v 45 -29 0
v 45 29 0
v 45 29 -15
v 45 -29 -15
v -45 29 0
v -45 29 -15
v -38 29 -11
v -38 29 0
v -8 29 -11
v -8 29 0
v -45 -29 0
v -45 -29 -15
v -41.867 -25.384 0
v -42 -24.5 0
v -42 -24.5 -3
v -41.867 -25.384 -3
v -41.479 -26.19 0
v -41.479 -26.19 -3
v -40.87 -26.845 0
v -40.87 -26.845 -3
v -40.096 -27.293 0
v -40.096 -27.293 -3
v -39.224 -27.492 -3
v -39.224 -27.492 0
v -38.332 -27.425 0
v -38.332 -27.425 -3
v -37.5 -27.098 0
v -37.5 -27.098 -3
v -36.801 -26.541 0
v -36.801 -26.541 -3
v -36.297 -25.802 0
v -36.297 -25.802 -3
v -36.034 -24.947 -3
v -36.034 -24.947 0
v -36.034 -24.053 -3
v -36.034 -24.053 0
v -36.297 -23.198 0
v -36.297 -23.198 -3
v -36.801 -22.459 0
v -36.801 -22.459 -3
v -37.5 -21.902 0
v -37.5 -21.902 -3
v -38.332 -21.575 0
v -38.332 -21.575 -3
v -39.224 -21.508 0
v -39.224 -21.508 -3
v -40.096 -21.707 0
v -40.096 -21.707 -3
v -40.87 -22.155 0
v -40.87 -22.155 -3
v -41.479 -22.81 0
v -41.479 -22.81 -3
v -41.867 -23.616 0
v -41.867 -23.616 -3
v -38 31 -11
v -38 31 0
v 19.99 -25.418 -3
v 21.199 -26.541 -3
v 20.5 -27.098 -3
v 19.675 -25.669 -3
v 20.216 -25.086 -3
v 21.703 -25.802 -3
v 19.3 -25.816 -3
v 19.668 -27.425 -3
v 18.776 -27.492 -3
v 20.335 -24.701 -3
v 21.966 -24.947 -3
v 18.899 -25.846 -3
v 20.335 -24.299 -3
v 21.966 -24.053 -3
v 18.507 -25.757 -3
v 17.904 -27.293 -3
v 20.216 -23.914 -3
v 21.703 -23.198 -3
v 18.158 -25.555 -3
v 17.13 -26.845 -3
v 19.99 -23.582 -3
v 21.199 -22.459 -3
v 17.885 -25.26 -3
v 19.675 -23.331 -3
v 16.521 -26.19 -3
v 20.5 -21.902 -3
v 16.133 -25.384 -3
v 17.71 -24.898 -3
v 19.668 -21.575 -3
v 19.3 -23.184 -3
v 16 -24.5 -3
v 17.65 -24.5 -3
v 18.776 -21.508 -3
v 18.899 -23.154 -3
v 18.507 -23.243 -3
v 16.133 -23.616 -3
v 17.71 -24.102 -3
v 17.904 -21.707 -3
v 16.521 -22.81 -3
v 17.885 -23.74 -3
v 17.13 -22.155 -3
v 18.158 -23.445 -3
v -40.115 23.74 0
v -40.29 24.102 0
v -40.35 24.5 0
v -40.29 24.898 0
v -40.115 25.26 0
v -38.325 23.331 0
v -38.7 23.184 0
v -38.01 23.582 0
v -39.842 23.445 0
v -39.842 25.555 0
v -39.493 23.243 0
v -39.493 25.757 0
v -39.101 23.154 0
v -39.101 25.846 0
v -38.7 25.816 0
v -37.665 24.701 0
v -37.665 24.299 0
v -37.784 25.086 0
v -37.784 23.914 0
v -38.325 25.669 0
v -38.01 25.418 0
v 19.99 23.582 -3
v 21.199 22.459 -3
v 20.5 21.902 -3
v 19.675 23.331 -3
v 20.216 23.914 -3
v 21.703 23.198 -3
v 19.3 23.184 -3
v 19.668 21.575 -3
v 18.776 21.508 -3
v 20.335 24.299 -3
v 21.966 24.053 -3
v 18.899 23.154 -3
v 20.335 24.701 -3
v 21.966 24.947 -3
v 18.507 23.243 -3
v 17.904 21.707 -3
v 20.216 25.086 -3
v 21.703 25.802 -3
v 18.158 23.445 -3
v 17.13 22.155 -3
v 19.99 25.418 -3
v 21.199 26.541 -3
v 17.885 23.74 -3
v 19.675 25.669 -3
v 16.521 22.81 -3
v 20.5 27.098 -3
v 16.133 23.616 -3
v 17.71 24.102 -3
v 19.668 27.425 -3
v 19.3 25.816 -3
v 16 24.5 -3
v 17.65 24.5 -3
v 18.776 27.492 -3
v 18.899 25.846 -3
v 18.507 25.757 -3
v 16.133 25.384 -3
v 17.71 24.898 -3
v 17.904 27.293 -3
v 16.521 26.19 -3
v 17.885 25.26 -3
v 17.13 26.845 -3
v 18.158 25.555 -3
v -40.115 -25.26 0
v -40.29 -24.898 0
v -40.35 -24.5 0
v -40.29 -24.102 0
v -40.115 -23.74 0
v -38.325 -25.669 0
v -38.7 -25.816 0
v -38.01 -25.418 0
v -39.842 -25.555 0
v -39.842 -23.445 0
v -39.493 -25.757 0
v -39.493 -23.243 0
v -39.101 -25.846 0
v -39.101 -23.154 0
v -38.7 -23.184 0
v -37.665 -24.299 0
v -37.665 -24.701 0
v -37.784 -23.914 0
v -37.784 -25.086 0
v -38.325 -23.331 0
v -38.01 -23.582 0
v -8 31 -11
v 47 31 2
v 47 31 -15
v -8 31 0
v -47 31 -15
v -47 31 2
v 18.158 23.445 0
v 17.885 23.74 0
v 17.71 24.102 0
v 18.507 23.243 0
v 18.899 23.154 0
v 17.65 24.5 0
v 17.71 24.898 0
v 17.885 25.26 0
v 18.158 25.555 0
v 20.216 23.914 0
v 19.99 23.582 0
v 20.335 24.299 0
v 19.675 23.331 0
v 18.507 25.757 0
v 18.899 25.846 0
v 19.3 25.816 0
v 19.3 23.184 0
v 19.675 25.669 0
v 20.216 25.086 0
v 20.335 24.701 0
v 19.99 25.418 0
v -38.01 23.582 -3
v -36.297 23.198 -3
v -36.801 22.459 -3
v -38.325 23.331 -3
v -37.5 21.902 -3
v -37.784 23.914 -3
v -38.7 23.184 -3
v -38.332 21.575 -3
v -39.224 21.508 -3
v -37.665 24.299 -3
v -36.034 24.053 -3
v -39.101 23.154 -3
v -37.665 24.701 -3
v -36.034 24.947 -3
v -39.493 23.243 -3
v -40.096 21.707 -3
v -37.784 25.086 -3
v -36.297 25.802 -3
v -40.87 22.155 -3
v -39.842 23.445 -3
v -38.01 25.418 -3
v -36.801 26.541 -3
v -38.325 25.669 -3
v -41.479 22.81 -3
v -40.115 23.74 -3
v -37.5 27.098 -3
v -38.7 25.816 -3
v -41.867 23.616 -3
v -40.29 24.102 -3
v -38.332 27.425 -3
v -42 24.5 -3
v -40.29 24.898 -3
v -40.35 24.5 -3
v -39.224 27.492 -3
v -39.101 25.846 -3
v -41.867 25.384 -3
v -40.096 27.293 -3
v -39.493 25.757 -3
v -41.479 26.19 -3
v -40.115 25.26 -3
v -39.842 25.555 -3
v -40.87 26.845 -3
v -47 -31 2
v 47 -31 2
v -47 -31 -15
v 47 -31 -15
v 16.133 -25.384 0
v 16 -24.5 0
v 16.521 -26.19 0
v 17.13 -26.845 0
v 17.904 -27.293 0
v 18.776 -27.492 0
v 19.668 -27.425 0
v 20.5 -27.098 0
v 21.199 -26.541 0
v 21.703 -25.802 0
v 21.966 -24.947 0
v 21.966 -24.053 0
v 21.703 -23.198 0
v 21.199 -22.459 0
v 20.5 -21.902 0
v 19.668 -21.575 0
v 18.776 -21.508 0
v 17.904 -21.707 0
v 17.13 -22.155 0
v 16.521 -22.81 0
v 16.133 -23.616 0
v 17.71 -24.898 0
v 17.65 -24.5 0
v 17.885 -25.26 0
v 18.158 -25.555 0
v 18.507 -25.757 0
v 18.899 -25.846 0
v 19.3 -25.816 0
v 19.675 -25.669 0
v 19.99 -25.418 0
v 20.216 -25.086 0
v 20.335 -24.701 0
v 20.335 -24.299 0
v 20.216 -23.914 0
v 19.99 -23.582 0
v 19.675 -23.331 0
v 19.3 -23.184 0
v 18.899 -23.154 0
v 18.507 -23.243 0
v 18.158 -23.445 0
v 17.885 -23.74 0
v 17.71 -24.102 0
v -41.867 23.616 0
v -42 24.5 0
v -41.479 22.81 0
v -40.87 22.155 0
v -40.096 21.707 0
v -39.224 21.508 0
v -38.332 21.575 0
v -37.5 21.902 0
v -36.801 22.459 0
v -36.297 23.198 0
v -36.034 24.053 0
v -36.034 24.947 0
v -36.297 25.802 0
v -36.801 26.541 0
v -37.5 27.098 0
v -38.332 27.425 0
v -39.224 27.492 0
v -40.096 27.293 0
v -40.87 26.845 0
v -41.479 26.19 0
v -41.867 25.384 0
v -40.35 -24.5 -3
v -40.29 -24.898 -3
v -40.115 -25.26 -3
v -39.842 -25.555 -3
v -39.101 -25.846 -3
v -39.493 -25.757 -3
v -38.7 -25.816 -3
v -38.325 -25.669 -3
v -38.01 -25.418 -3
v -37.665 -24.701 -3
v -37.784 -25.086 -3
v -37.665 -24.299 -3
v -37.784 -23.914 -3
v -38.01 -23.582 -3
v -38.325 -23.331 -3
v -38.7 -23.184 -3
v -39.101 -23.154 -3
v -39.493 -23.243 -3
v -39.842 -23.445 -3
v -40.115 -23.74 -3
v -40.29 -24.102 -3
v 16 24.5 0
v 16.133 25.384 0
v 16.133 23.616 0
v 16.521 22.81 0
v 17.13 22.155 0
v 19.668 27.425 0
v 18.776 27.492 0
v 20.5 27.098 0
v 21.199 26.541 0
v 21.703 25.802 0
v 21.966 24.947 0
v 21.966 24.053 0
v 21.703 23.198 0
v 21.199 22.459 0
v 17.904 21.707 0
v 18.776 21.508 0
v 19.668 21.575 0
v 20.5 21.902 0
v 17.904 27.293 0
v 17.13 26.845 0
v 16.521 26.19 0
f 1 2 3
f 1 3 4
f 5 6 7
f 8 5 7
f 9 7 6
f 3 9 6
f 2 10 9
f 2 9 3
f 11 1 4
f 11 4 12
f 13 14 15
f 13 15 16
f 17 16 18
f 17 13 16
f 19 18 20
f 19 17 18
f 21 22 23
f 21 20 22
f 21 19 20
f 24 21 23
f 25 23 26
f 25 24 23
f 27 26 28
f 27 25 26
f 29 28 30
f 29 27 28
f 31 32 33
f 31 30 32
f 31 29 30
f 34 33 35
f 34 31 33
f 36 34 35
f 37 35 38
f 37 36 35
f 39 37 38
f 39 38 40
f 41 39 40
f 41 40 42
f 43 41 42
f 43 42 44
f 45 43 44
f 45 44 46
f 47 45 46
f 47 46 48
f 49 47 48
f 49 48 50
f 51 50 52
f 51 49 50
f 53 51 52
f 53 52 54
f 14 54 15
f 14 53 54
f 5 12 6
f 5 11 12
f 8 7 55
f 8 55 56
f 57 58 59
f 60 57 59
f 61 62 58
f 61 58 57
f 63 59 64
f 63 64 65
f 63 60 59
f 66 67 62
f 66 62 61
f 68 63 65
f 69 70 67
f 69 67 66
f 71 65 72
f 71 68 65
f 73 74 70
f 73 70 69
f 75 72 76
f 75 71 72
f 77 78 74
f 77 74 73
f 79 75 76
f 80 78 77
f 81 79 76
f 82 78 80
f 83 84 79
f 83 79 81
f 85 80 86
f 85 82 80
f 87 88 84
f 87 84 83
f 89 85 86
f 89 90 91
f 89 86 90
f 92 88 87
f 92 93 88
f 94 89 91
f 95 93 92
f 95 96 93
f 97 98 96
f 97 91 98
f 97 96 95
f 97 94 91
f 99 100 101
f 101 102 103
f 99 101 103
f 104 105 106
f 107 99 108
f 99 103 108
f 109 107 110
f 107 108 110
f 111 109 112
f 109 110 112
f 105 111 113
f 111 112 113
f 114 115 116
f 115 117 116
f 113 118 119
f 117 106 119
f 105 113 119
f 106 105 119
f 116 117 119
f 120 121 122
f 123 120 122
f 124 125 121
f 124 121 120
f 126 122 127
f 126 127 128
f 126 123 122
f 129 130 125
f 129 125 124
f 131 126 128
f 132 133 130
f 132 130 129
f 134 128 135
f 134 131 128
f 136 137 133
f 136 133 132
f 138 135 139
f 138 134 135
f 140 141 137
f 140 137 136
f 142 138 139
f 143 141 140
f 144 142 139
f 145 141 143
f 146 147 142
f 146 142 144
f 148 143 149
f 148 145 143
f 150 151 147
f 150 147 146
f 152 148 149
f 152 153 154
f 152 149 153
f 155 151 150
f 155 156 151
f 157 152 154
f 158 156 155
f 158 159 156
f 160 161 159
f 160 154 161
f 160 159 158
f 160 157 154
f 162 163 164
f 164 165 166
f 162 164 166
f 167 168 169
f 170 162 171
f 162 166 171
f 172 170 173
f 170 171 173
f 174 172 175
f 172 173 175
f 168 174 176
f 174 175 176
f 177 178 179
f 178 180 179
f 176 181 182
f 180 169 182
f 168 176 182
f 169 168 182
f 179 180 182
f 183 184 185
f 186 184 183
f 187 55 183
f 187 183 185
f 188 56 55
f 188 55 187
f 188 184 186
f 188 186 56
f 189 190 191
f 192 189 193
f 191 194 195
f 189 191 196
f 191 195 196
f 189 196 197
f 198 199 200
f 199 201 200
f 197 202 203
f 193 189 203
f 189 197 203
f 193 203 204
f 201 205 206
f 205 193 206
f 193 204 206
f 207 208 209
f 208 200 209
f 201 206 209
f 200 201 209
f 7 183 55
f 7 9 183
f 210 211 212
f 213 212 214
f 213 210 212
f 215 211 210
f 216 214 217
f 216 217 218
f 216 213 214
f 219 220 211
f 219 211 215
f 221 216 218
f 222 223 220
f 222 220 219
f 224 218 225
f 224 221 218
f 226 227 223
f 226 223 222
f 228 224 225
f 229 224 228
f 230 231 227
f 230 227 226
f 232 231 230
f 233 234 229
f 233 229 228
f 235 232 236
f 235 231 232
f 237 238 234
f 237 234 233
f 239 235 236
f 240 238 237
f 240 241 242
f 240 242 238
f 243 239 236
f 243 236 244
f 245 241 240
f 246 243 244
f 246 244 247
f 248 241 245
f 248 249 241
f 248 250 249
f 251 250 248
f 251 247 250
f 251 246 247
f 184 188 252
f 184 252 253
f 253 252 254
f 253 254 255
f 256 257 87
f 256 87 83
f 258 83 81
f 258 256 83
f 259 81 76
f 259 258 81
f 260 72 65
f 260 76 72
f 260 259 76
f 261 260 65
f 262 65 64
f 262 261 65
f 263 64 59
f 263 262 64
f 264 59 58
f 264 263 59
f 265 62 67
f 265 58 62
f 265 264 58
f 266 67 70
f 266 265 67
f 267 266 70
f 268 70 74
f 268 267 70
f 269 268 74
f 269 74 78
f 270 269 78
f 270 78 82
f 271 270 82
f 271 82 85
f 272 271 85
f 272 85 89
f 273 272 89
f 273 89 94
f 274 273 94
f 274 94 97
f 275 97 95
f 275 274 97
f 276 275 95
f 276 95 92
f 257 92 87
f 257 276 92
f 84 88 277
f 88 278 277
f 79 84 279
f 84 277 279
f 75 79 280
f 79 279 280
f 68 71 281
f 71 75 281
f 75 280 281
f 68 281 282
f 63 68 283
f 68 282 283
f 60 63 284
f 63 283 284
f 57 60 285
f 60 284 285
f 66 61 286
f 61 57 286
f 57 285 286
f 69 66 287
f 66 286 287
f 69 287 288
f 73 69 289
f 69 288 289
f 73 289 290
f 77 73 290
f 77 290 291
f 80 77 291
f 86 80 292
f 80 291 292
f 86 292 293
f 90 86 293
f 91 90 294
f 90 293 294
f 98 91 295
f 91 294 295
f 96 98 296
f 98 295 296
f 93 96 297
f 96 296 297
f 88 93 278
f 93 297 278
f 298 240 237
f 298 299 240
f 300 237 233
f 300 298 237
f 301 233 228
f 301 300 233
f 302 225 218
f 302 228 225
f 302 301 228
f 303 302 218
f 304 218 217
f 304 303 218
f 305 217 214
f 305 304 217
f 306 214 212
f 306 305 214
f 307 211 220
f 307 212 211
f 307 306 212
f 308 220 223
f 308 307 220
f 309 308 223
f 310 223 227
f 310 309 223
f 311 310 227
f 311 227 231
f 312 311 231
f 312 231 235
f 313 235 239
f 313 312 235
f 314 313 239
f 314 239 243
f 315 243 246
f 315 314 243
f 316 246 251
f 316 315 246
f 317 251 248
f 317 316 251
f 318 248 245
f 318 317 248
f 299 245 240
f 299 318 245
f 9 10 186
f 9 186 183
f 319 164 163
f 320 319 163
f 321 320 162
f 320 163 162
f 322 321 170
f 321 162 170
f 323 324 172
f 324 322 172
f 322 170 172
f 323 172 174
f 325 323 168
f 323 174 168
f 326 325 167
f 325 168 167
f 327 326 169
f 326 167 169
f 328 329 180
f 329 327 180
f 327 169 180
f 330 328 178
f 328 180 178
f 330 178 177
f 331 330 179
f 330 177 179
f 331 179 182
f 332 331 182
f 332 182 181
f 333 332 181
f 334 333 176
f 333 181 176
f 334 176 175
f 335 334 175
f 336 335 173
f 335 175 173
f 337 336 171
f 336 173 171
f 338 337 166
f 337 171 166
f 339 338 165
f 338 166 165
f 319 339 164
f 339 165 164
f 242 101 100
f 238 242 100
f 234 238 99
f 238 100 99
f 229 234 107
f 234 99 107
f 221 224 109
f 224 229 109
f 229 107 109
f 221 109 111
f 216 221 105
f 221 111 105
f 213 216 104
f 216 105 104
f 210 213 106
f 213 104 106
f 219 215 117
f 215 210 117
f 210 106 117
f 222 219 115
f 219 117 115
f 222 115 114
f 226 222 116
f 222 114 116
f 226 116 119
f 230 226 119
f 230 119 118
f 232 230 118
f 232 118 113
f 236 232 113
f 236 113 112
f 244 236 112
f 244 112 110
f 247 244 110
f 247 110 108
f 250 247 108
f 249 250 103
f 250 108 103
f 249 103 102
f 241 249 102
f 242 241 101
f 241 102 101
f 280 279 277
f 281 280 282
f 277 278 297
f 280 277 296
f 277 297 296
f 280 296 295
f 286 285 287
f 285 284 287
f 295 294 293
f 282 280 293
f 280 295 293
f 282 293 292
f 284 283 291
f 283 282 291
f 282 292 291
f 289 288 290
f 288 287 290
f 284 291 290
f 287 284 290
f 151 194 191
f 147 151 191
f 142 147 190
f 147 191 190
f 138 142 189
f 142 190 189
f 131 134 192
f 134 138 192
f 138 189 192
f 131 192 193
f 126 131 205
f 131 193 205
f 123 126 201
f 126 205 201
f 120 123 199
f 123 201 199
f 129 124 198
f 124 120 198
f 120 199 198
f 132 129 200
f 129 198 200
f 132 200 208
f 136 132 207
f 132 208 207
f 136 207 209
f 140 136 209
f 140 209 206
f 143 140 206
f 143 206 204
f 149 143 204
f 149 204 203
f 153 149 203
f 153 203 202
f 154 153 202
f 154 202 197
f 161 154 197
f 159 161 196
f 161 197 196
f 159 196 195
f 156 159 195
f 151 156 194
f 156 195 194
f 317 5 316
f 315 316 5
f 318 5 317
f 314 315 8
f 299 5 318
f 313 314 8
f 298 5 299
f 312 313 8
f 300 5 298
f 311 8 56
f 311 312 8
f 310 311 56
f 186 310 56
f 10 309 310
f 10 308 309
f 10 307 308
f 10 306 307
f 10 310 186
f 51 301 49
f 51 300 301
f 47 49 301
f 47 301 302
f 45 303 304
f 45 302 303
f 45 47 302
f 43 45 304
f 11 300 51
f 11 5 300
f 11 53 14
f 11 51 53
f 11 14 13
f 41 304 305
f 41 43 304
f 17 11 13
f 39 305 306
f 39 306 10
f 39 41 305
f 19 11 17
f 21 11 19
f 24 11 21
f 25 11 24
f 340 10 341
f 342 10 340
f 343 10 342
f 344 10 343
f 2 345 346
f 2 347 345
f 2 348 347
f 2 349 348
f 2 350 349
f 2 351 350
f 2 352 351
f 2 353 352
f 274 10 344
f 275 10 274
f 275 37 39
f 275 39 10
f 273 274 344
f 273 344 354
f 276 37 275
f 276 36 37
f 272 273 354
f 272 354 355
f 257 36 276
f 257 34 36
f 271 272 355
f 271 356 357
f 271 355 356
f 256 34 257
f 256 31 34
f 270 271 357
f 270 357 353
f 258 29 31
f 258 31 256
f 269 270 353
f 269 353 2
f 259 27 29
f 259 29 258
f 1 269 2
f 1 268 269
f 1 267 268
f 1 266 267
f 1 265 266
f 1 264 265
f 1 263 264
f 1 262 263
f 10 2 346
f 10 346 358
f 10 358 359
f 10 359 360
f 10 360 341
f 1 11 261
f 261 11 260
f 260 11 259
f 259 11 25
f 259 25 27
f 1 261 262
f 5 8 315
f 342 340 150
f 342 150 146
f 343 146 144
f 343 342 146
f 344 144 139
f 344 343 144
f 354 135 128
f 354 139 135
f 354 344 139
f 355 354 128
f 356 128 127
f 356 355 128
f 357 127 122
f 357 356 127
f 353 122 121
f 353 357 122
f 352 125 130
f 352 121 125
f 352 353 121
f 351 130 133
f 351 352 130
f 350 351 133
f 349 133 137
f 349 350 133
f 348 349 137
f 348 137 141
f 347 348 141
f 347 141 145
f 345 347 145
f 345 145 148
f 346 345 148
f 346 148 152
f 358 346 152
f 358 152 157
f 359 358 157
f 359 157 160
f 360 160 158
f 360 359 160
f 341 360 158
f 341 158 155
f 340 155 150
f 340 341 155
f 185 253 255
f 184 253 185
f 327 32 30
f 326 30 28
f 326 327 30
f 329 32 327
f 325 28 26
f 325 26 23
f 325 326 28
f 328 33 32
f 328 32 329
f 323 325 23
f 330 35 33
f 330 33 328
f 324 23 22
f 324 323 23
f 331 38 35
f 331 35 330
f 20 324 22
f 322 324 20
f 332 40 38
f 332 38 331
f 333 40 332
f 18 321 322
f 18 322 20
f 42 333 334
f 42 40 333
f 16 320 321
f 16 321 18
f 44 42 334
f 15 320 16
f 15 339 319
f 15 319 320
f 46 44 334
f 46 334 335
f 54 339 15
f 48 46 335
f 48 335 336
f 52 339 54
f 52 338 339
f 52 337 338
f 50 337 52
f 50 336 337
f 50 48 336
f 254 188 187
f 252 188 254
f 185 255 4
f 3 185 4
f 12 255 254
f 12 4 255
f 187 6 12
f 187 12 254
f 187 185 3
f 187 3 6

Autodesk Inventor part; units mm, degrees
ref_plane "YZ Plane" through (0, 0, 0) normal (1, 0, 0) x (0, 1, 0)
ref_plane "XZ Plane" through (0, 0, 0) normal (0, 1, 0) x (-1, 0, 0)
ref_plane "XY Plane" through (0, 0, 0) normal (0, 0, 1) x (1, 0, 0)
ref_plane "Work Plane1" through (0, 0, 0) normal (0, 0, 1) x (1, 0, 0)
sketch "Sketch1" plane through (0, 0, 0) normal (0, 0, 1) x (1, 0, 0)
  line L0 (47, 31) -> (-47, 31)
  line L1 (-47, 31) -> (-47, -31)
  line L2 (-47, -31) -> (47, -31)
  line L3 (47, -31) -> (47, 31)
  line L4 (47, 31) -> (-47, -31) construction
  line L5 (-47, 31) -> (47, -31) construction
  point P0 (0, 0)
  dimension "d0" = 94
  dimension "d1" = 62
extrude "Extrusion1" add sketch "Sketch1" along normal blind 2
sketch "Sketch2" plane through (0, 0, 0) normal (0, 0, -1) x (-1, 0, 0)
  circle A0 centre (39, 24.5) radius 3 projected
  circle A1 centre (39, 24.5) radius 1.35 projected
  circle A2 centre (39, -24.5) radius 3 projected
  circle A3 centre (39, -24.5) radius 1.35 projected
  circle A4 centre (-19, -24.5) radius 3 projected
  circle A5 centre (-19, -24.5) radius 1.35 projected
  circle A6 centre (-19, 24.5) radius 3 projected
  circle A7 centre (-19, 24.5) radius 1.35 projected
  point P0 (0, 0)
extrude "Extrusion2" add sketch "Sketch2" along normal blind 3
sketch "Sketch3" plane through (0, 0, 0) normal (0, 0, -1) x (-1, 0, 0)
  circle A0 centre (-19, -24.5) radius 3 projected
  circle A1 centre (39, -24.5) radius 3 projected
  circle A2 centre (-19, 24.5) radius 3 projected
  circle A3 centre (39, 24.5) radius 3 projected
  line L0 (47, 31) -> (47, -31) projected
  line L1 (-47, 31) -> (47, 31) projected
  line L2 (-47, -31) -> (-47, 31) projected
  line L3 (47, -31) -> (-47, -31) projected
  line L4 (45, -29) -> (45, 29)
  line L5 (45, 29) -> (-45, 29)
  line L6 (-45, 29) -> (-45, -29)
  line L7 (-45, -29) -> (45, -29)
  point P0 (0, 0)
  dimension "d6" = 2
extrude "Extrusion3" add sketch "Sketch3" along normal blind 15 contours L0 L3 L2 L1
sketch "Sketch4" plane through (-45, 29, 0) normal (0, -1, 0) x (1, 0, 0)
  point P0 (45, 0)
sketch "Sketch5" plane through (-45, 29, 0) normal (0, -1, 0) x (1, 0, 0)
  line L0 (0, 0) -> (90, 0) projected
  line L1 (7, 0) -> (37, 0)
  line L2 (37, 0) -> (37, -11)
  line L3 (37, -11) -> (7, -11)
  line L4 (7, -11) -> (7, 0)
  line L5 (0, 0) -> (0, -15) projected
  line L6 (90, -15) -> (0, -15) projected
  point P0 (45, 0)
  dimension "d9" = 30
  dimension "d10" = 7
  dimension "d11" = 4
extrude "Extrusion4" cut sketch "Sketch5" against normal blind 15
properties part number "rpi4_case"
